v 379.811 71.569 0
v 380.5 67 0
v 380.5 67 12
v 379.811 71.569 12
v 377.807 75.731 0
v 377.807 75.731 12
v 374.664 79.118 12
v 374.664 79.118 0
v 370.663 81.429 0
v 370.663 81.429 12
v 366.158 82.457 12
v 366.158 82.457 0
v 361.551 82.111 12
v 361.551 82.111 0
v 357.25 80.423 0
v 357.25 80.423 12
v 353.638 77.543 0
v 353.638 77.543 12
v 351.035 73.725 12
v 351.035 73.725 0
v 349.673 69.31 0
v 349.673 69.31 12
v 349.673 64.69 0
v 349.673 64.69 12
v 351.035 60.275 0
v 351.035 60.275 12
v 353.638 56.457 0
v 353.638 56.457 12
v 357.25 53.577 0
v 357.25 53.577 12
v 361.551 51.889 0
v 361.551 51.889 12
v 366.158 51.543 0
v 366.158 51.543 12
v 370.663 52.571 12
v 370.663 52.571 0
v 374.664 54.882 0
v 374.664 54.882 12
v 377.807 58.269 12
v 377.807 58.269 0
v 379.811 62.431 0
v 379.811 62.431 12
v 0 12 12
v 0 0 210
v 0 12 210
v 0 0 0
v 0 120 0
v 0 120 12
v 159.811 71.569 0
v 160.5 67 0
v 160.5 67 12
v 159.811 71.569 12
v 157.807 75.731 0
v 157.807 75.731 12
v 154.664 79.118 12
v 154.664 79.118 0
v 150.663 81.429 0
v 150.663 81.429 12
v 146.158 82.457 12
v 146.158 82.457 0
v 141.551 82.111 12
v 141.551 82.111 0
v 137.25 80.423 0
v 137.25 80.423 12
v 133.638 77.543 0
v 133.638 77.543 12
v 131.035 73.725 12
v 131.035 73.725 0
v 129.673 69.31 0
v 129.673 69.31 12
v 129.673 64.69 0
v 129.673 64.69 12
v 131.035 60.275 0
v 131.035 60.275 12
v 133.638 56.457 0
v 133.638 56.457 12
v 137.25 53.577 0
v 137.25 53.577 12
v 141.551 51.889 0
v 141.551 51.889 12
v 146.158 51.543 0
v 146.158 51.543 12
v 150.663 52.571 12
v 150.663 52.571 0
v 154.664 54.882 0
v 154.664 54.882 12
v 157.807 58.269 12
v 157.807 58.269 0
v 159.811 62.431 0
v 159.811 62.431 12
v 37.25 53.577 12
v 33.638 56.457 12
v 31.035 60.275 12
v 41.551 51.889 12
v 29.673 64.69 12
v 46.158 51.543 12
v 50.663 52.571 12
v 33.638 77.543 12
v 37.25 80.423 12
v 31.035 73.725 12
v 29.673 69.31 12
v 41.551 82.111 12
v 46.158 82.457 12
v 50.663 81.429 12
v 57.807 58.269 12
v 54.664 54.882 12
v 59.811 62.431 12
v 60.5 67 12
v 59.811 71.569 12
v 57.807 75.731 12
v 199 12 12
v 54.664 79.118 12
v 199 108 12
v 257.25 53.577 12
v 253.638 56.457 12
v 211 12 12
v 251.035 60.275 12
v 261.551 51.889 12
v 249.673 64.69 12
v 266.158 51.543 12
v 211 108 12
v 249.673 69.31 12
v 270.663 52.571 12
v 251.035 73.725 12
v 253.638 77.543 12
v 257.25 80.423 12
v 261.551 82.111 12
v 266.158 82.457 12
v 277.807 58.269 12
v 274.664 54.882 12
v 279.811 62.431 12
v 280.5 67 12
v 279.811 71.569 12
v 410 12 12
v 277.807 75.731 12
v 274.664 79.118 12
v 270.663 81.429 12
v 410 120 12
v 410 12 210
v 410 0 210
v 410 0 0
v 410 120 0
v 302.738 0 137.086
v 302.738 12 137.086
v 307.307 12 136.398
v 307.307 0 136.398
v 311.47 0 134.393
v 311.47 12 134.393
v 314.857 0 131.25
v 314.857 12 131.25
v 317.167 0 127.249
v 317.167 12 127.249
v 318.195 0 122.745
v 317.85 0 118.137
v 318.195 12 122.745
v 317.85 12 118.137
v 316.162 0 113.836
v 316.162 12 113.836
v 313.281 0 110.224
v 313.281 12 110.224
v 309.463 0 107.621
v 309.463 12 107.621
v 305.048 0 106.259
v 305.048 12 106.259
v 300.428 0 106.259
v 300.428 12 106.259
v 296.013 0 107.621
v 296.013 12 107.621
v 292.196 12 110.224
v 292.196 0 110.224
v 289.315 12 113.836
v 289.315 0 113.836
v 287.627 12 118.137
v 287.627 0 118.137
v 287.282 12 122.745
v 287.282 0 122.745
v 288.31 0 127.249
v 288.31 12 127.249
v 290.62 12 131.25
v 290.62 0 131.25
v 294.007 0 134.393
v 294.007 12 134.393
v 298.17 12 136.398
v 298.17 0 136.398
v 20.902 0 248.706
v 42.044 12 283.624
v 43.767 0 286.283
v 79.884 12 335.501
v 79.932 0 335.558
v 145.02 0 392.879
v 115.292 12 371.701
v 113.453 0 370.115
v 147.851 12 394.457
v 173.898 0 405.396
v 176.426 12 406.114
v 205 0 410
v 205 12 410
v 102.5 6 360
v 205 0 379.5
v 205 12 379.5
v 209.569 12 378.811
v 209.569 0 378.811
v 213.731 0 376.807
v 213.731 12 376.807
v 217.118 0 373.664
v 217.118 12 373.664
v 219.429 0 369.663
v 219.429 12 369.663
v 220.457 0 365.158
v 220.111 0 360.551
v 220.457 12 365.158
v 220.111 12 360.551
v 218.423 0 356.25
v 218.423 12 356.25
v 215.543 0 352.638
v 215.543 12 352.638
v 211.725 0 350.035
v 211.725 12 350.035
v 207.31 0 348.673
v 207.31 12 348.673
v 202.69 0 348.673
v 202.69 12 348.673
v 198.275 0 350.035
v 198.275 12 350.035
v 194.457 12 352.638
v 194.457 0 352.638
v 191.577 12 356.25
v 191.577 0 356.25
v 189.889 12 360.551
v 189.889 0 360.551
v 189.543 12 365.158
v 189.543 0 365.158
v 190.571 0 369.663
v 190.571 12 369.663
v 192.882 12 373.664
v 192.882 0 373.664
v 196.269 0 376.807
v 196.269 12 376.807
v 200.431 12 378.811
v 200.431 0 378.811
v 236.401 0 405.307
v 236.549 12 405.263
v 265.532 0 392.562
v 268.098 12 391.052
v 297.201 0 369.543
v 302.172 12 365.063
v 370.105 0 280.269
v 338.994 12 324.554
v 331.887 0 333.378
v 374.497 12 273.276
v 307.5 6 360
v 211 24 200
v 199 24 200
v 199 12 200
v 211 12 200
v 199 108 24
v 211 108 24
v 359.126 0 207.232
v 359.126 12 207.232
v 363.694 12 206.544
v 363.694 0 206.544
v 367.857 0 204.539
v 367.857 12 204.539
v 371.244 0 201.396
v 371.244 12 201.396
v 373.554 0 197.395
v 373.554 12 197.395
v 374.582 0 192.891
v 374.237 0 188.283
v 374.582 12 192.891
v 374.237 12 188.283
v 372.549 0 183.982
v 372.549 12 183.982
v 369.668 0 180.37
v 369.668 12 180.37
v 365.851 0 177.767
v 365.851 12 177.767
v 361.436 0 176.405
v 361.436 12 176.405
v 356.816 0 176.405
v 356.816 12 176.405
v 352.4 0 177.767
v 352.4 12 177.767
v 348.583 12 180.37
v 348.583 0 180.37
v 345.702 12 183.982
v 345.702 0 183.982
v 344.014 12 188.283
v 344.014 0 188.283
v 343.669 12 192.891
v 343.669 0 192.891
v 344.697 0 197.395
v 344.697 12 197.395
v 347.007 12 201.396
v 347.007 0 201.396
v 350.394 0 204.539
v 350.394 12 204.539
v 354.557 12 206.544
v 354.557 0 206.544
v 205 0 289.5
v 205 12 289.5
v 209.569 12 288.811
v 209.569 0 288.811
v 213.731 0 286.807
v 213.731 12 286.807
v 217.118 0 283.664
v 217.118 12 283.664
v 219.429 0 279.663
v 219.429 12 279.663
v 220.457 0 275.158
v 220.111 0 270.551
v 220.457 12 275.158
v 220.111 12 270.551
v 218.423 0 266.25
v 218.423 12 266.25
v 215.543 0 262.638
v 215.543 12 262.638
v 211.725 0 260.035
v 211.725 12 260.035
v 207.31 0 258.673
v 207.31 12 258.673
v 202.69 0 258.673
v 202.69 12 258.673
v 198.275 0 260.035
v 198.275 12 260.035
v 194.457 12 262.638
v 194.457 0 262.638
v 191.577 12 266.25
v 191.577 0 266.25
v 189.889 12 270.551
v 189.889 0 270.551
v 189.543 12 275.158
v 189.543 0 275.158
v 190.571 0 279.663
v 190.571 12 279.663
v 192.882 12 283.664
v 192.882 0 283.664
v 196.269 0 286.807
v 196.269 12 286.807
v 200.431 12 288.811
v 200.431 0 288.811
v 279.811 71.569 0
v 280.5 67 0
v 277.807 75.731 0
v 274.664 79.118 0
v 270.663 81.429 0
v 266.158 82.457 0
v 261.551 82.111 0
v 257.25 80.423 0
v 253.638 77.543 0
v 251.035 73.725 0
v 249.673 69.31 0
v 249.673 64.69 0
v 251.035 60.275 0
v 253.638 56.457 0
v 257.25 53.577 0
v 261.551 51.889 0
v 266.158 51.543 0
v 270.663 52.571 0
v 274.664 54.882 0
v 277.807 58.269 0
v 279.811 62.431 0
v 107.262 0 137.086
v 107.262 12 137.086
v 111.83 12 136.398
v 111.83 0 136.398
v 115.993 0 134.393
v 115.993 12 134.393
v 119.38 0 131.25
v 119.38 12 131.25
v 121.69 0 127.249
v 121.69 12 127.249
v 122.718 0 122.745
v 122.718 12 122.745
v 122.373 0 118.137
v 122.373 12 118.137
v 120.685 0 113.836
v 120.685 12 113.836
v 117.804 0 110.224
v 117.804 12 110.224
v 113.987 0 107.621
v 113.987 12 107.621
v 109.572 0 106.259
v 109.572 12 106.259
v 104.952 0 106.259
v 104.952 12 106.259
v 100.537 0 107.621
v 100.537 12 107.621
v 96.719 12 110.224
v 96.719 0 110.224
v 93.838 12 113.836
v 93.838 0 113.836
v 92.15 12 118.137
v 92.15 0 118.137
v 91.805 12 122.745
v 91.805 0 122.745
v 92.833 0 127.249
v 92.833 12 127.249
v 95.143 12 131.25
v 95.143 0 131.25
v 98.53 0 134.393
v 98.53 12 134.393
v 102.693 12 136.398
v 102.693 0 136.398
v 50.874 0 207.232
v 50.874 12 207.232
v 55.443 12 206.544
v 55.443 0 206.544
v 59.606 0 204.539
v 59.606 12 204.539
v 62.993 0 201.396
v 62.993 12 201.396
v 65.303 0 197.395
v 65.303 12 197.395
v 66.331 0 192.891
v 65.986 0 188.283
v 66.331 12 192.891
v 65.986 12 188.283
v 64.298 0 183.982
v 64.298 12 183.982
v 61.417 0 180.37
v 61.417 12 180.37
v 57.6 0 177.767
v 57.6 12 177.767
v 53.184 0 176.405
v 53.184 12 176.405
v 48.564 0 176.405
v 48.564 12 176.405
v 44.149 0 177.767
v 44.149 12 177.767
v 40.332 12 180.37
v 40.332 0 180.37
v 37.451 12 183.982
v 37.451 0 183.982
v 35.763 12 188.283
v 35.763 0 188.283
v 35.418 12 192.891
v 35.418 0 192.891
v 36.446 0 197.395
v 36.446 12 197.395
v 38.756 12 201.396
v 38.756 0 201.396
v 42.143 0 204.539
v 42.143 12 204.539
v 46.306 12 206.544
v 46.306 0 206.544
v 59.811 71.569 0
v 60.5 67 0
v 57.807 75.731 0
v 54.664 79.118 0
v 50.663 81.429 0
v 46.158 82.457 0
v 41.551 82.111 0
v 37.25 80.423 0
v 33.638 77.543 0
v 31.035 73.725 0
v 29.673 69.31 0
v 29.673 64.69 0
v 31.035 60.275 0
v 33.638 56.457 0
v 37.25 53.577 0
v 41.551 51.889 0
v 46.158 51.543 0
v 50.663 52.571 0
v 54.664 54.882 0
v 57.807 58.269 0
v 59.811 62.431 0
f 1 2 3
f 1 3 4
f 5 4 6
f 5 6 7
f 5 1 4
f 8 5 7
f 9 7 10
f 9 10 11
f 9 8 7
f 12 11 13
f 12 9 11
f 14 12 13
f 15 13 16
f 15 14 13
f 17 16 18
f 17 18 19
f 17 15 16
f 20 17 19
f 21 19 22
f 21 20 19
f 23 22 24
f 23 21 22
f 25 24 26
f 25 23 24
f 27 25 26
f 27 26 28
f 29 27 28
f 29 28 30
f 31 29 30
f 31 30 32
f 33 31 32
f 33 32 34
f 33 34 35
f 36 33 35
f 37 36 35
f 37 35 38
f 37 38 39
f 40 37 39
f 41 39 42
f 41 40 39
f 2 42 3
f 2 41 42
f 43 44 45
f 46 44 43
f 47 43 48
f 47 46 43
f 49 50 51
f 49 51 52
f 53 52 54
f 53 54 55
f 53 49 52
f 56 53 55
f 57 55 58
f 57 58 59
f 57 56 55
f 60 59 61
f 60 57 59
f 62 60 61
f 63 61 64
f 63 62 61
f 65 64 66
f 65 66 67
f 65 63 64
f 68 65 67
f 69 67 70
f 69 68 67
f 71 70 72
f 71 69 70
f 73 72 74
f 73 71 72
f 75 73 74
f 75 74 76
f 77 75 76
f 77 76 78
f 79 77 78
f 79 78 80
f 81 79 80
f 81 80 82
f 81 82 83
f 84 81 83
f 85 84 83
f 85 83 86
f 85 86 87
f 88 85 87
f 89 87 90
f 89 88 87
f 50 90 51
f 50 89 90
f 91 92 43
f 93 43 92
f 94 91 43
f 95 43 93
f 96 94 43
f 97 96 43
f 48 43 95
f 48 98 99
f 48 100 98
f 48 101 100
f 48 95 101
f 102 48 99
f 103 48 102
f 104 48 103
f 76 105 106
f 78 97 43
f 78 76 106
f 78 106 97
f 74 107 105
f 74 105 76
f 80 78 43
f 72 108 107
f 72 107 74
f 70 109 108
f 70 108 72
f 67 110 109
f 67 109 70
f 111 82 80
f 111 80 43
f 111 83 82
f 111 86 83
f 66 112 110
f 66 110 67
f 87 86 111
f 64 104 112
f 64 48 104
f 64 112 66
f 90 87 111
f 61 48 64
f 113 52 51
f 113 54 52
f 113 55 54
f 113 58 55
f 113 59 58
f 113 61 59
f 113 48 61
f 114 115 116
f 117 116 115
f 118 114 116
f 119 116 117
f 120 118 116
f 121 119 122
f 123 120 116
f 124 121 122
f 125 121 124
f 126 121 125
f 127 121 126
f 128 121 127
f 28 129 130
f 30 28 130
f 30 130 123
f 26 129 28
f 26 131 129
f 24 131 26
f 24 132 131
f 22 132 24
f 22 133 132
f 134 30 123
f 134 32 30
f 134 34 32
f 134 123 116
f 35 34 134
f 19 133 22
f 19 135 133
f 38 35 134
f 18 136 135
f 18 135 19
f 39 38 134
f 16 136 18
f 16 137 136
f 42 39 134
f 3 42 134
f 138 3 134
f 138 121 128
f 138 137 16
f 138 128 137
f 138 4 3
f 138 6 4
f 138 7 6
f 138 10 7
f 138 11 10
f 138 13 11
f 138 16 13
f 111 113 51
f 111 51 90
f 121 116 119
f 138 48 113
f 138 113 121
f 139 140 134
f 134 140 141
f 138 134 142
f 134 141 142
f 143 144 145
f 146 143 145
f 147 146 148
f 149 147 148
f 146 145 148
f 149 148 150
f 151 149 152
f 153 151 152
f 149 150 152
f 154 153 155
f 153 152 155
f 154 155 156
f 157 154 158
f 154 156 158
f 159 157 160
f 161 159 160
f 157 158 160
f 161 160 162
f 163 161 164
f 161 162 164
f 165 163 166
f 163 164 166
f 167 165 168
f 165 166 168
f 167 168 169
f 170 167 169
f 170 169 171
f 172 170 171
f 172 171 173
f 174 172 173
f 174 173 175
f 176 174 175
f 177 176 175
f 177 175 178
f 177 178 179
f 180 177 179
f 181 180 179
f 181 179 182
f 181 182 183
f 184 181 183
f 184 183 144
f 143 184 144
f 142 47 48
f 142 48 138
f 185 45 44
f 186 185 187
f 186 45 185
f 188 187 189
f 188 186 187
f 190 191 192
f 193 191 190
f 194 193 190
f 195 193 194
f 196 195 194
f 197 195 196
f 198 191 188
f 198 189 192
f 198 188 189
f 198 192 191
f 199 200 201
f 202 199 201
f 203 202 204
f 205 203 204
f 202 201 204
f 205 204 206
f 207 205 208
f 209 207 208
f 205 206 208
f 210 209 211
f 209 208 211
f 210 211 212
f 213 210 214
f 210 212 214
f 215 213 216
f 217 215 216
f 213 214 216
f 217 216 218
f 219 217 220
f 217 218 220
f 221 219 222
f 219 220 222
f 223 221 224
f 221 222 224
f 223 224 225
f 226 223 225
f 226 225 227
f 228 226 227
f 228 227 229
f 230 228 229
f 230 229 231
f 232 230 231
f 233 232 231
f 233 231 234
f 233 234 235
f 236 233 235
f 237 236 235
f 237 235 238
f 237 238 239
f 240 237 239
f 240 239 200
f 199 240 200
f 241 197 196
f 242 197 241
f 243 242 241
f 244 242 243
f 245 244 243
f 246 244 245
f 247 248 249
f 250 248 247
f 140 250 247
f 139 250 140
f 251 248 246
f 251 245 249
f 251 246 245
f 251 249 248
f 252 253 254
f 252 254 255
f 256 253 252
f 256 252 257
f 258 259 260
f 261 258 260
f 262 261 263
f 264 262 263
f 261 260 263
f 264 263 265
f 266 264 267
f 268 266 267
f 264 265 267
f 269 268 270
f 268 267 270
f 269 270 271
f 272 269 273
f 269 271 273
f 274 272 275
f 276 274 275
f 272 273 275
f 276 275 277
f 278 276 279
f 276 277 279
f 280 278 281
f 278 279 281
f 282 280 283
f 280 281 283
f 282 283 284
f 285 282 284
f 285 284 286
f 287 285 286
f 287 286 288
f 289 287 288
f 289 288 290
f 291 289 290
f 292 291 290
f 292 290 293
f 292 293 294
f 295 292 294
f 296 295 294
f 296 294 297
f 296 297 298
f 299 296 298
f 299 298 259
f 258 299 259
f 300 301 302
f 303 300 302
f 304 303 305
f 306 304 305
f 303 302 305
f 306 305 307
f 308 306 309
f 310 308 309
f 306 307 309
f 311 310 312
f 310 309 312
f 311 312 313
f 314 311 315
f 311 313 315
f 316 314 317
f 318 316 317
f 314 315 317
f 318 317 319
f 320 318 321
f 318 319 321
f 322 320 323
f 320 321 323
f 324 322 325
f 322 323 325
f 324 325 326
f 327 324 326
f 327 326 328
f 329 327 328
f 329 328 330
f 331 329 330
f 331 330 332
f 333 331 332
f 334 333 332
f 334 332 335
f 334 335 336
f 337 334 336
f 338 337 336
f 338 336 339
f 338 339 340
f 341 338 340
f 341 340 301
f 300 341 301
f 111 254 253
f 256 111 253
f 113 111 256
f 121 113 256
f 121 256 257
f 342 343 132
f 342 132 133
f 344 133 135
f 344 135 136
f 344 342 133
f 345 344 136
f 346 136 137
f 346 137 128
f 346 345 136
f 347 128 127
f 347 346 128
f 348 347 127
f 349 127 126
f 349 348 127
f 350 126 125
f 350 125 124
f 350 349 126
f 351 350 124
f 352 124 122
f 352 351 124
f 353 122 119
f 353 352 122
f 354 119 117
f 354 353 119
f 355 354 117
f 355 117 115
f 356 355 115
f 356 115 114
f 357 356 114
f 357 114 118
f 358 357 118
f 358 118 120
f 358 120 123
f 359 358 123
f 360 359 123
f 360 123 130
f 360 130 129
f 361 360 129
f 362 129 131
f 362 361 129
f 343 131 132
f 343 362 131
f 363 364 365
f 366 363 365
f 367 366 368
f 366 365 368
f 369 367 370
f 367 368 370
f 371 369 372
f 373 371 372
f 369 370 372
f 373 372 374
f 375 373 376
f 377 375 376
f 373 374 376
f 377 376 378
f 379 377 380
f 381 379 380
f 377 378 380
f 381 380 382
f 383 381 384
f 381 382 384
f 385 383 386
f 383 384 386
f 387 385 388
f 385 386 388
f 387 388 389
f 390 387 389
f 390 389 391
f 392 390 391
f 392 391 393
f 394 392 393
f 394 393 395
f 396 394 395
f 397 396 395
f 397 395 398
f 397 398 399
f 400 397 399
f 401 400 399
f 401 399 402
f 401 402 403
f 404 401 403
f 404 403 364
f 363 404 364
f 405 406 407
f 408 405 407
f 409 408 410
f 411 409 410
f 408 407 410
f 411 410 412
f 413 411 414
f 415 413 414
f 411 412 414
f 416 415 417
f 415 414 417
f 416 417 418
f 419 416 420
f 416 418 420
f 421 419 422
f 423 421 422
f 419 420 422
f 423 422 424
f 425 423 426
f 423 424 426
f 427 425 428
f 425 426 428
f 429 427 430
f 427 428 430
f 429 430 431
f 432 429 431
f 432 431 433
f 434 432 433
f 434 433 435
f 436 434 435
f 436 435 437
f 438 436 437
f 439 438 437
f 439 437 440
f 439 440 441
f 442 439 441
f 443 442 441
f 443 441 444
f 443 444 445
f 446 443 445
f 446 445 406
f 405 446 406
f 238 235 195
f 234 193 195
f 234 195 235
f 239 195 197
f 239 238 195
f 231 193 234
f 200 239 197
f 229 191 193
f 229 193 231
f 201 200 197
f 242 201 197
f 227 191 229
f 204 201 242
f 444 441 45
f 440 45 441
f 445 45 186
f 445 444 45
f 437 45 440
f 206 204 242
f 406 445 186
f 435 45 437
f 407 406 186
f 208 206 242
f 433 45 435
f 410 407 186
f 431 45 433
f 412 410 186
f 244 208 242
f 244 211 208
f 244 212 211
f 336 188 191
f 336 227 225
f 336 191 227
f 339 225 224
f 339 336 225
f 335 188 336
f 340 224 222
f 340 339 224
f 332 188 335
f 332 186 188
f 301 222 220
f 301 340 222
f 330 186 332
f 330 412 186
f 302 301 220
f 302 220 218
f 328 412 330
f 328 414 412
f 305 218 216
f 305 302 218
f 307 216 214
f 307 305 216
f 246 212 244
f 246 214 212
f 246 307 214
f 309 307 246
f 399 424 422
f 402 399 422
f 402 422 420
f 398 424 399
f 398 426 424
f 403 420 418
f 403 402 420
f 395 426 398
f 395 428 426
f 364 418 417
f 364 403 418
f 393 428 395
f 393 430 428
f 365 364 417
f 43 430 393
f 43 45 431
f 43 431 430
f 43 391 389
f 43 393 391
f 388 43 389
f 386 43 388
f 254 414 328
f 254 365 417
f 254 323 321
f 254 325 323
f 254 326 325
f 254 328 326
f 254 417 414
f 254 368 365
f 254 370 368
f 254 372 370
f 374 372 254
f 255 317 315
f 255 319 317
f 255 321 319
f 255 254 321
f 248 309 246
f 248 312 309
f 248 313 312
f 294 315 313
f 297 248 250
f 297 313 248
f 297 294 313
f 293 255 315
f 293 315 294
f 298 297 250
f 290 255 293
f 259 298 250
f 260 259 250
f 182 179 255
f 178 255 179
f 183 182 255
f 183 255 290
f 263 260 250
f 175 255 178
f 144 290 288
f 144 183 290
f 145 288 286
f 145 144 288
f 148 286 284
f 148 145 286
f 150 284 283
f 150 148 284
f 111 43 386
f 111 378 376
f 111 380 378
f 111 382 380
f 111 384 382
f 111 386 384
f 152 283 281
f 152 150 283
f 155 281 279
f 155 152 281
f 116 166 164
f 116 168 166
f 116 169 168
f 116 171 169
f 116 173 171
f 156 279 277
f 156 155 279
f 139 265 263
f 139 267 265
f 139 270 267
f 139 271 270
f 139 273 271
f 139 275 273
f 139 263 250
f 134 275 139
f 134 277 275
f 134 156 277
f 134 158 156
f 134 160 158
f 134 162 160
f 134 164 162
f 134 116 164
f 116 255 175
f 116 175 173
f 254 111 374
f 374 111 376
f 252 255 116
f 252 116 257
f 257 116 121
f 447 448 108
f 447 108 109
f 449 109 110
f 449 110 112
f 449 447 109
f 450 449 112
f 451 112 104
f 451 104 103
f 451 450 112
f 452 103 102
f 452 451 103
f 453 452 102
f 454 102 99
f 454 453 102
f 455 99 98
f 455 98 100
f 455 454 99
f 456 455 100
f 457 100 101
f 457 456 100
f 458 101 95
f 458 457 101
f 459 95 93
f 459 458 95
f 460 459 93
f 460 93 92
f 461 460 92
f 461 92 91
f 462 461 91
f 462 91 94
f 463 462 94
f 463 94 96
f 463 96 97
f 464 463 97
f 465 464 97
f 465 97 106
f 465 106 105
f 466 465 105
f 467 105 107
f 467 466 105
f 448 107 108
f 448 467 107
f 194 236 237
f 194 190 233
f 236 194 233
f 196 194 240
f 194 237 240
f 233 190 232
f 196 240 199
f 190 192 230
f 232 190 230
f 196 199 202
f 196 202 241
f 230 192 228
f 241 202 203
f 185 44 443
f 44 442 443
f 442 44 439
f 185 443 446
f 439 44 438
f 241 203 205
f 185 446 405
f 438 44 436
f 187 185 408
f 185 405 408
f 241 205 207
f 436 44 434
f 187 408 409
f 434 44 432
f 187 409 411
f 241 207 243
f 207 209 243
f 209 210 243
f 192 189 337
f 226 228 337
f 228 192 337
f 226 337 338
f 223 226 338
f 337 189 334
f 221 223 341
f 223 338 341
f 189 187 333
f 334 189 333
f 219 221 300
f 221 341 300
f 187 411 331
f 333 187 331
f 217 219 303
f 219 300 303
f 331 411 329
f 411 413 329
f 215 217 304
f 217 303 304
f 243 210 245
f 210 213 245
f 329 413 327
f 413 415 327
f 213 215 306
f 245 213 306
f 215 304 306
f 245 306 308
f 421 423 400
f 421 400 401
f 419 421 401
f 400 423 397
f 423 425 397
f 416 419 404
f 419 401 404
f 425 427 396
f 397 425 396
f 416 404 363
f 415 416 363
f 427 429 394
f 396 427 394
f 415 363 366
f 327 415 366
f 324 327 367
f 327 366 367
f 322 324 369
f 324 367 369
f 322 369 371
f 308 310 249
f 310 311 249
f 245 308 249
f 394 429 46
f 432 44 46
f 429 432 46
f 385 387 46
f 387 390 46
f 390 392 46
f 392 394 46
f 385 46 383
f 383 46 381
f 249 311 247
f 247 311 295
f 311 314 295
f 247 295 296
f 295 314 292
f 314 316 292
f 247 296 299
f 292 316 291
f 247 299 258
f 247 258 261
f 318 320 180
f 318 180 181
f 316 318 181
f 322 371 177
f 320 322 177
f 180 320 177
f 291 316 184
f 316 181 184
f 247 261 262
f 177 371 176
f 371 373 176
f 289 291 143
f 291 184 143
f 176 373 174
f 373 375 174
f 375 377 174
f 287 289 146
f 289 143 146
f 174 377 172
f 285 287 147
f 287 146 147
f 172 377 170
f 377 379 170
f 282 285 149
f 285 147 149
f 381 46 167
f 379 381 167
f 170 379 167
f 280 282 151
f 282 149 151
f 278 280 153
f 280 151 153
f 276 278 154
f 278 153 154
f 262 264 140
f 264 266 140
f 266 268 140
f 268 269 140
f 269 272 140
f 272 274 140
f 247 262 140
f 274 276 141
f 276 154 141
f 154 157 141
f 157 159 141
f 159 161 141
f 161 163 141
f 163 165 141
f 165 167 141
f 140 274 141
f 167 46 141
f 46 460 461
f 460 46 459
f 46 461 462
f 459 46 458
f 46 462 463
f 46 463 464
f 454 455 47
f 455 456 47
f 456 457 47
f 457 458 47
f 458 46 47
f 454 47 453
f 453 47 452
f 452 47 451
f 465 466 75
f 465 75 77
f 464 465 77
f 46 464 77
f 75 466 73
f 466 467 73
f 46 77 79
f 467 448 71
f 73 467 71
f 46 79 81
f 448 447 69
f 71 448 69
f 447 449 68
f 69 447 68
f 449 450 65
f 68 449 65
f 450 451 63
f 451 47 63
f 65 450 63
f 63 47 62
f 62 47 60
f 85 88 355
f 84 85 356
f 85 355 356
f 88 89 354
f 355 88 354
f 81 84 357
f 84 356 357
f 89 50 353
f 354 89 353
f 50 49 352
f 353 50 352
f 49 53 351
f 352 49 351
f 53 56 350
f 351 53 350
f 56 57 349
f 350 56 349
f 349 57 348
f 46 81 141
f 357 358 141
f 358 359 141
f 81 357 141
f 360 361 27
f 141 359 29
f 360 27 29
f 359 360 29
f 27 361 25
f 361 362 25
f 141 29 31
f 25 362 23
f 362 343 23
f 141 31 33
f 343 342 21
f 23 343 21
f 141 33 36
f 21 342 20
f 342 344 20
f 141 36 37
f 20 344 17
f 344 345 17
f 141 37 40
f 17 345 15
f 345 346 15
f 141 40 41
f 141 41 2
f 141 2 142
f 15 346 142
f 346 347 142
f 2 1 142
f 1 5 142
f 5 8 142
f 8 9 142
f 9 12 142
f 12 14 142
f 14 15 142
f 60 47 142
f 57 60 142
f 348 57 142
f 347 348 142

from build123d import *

# Parameters (mm, degrees)
SKETCH1_W      = 410
SKETCH1_H      = 120
SKETCH1_R      = 15.5
EXTRUDE1_DEPTH = 12
SKETCH2_W      = 410
SKETCH2_H      = 12
EXTRUDE2_DEPTH = 398
SKETCH3_R      = 15.5
EXTRUDE3_DEPTH = 198
SKETCH4_W      = 12
SKETCH4_H      = 96
EXTRUDE4_DEPTH = 188
EXTRUDE5_DEPTH = 188


with BuildPart() as part:
    # Sketch1 → Extrude1 (new body)
    with BuildSketch(Plane.XY):
        with Locations((205, 60)):
            Rectangle(SKETCH1_W, SKETCH1_H)
        with Locations((45, 67)):
            Circle(SKETCH1_R, mode=Mode.SUBTRACT)
        with Locations((145, 67)):
            Circle(SKETCH1_R, mode=Mode.SUBTRACT)
        with Locations((365, 67)):
            Circle(SKETCH1_R, mode=Mode.SUBTRACT)
        with Locations((265, 67)):
            Circle(SKETCH1_R, mode=Mode.SUBTRACT)
    extrude(amount=EXTRUDE1_DEPTH)

    # Sketch2 → Extrude2 (add)
    with BuildSketch(Plane.XY.offset(12)):
        with Locations((205, 6)):
            Rectangle(SKETCH2_W, SKETCH2_H)
    extrude(amount=EXTRUDE2_DEPTH)

    # Sketch3 → Extrude3 (cut)
    with BuildSketch(Plane(origin=(0, 12, 0), x_dir=(1, 0, 0), z_dir=(0, 1, 0))):
        with BuildLine():
            add(Edge.make_bspline(
                [(205, -410), (307.5, -410), (410, -210)],
                knots=[0.5, 0.5, 0.5, 1, 1, 1], degree=2))
            Line((205, -410), (410, -410))
            Line((410, -410), (410, -210))
        make_face()
        with BuildLine():
            add(Edge.make_bspline(
                [(0, -210), (102.5, -410), (205, -410)],
                knots=[0, 0, 0, 0.5, 0.5, 0.5], degree=2))
            Line((0, -210), (0, -410))
            Line((0, -410), (205, -410))
        make_face()
        with Locations(Location((107.261778202, -121.586347917, 0), (0, 0, 270))):
            Circle(SKETCH3_R)
        with Locations(Location((205, -364, 0), (0, 0, 270))):
            Circle(SKETCH3_R)
        with Locations(Location((50.874342549, -191.732317869, 0), (0, 0, 270))):
            Circle(SKETCH3_R)
        with Locations(Location((205, -274, 0), (0, 0, 270))):
            Circle(SKETCH3_R)
        with Locations(Location((359.125657451, -191.732317869, 0), (0, 0, 270))):
            Circle(SKETCH3_R)
        with Locations(Location((302.738221798, -121.586347917, 0), (0, 0, 270))):
            Circle(SKETCH3_R)
    extrude(amount=-EXTRUDE3_DEPTH, mode=Mode.SUBTRACT)

    # Sketch4 → Extrude4 (add)
    with BuildSketch(Plane.XY.offset(12)):
        with Locations((205, 60)):
            Rectangle(SKETCH4_W, SKETCH4_H)
    extrude(amount=EXTRUDE4_DEPTH)

    # Sketch5 → Extrude5 (cut)
    with BuildSketch(Plane.ZY.offset(-199)):
        Polygon((200, 108), (200, 24), (24, 108), align=None)
    extrude(amount=-EXTRUDE5_DEPTH, mode=Mode.SUBTRACT)


solid = part.part
